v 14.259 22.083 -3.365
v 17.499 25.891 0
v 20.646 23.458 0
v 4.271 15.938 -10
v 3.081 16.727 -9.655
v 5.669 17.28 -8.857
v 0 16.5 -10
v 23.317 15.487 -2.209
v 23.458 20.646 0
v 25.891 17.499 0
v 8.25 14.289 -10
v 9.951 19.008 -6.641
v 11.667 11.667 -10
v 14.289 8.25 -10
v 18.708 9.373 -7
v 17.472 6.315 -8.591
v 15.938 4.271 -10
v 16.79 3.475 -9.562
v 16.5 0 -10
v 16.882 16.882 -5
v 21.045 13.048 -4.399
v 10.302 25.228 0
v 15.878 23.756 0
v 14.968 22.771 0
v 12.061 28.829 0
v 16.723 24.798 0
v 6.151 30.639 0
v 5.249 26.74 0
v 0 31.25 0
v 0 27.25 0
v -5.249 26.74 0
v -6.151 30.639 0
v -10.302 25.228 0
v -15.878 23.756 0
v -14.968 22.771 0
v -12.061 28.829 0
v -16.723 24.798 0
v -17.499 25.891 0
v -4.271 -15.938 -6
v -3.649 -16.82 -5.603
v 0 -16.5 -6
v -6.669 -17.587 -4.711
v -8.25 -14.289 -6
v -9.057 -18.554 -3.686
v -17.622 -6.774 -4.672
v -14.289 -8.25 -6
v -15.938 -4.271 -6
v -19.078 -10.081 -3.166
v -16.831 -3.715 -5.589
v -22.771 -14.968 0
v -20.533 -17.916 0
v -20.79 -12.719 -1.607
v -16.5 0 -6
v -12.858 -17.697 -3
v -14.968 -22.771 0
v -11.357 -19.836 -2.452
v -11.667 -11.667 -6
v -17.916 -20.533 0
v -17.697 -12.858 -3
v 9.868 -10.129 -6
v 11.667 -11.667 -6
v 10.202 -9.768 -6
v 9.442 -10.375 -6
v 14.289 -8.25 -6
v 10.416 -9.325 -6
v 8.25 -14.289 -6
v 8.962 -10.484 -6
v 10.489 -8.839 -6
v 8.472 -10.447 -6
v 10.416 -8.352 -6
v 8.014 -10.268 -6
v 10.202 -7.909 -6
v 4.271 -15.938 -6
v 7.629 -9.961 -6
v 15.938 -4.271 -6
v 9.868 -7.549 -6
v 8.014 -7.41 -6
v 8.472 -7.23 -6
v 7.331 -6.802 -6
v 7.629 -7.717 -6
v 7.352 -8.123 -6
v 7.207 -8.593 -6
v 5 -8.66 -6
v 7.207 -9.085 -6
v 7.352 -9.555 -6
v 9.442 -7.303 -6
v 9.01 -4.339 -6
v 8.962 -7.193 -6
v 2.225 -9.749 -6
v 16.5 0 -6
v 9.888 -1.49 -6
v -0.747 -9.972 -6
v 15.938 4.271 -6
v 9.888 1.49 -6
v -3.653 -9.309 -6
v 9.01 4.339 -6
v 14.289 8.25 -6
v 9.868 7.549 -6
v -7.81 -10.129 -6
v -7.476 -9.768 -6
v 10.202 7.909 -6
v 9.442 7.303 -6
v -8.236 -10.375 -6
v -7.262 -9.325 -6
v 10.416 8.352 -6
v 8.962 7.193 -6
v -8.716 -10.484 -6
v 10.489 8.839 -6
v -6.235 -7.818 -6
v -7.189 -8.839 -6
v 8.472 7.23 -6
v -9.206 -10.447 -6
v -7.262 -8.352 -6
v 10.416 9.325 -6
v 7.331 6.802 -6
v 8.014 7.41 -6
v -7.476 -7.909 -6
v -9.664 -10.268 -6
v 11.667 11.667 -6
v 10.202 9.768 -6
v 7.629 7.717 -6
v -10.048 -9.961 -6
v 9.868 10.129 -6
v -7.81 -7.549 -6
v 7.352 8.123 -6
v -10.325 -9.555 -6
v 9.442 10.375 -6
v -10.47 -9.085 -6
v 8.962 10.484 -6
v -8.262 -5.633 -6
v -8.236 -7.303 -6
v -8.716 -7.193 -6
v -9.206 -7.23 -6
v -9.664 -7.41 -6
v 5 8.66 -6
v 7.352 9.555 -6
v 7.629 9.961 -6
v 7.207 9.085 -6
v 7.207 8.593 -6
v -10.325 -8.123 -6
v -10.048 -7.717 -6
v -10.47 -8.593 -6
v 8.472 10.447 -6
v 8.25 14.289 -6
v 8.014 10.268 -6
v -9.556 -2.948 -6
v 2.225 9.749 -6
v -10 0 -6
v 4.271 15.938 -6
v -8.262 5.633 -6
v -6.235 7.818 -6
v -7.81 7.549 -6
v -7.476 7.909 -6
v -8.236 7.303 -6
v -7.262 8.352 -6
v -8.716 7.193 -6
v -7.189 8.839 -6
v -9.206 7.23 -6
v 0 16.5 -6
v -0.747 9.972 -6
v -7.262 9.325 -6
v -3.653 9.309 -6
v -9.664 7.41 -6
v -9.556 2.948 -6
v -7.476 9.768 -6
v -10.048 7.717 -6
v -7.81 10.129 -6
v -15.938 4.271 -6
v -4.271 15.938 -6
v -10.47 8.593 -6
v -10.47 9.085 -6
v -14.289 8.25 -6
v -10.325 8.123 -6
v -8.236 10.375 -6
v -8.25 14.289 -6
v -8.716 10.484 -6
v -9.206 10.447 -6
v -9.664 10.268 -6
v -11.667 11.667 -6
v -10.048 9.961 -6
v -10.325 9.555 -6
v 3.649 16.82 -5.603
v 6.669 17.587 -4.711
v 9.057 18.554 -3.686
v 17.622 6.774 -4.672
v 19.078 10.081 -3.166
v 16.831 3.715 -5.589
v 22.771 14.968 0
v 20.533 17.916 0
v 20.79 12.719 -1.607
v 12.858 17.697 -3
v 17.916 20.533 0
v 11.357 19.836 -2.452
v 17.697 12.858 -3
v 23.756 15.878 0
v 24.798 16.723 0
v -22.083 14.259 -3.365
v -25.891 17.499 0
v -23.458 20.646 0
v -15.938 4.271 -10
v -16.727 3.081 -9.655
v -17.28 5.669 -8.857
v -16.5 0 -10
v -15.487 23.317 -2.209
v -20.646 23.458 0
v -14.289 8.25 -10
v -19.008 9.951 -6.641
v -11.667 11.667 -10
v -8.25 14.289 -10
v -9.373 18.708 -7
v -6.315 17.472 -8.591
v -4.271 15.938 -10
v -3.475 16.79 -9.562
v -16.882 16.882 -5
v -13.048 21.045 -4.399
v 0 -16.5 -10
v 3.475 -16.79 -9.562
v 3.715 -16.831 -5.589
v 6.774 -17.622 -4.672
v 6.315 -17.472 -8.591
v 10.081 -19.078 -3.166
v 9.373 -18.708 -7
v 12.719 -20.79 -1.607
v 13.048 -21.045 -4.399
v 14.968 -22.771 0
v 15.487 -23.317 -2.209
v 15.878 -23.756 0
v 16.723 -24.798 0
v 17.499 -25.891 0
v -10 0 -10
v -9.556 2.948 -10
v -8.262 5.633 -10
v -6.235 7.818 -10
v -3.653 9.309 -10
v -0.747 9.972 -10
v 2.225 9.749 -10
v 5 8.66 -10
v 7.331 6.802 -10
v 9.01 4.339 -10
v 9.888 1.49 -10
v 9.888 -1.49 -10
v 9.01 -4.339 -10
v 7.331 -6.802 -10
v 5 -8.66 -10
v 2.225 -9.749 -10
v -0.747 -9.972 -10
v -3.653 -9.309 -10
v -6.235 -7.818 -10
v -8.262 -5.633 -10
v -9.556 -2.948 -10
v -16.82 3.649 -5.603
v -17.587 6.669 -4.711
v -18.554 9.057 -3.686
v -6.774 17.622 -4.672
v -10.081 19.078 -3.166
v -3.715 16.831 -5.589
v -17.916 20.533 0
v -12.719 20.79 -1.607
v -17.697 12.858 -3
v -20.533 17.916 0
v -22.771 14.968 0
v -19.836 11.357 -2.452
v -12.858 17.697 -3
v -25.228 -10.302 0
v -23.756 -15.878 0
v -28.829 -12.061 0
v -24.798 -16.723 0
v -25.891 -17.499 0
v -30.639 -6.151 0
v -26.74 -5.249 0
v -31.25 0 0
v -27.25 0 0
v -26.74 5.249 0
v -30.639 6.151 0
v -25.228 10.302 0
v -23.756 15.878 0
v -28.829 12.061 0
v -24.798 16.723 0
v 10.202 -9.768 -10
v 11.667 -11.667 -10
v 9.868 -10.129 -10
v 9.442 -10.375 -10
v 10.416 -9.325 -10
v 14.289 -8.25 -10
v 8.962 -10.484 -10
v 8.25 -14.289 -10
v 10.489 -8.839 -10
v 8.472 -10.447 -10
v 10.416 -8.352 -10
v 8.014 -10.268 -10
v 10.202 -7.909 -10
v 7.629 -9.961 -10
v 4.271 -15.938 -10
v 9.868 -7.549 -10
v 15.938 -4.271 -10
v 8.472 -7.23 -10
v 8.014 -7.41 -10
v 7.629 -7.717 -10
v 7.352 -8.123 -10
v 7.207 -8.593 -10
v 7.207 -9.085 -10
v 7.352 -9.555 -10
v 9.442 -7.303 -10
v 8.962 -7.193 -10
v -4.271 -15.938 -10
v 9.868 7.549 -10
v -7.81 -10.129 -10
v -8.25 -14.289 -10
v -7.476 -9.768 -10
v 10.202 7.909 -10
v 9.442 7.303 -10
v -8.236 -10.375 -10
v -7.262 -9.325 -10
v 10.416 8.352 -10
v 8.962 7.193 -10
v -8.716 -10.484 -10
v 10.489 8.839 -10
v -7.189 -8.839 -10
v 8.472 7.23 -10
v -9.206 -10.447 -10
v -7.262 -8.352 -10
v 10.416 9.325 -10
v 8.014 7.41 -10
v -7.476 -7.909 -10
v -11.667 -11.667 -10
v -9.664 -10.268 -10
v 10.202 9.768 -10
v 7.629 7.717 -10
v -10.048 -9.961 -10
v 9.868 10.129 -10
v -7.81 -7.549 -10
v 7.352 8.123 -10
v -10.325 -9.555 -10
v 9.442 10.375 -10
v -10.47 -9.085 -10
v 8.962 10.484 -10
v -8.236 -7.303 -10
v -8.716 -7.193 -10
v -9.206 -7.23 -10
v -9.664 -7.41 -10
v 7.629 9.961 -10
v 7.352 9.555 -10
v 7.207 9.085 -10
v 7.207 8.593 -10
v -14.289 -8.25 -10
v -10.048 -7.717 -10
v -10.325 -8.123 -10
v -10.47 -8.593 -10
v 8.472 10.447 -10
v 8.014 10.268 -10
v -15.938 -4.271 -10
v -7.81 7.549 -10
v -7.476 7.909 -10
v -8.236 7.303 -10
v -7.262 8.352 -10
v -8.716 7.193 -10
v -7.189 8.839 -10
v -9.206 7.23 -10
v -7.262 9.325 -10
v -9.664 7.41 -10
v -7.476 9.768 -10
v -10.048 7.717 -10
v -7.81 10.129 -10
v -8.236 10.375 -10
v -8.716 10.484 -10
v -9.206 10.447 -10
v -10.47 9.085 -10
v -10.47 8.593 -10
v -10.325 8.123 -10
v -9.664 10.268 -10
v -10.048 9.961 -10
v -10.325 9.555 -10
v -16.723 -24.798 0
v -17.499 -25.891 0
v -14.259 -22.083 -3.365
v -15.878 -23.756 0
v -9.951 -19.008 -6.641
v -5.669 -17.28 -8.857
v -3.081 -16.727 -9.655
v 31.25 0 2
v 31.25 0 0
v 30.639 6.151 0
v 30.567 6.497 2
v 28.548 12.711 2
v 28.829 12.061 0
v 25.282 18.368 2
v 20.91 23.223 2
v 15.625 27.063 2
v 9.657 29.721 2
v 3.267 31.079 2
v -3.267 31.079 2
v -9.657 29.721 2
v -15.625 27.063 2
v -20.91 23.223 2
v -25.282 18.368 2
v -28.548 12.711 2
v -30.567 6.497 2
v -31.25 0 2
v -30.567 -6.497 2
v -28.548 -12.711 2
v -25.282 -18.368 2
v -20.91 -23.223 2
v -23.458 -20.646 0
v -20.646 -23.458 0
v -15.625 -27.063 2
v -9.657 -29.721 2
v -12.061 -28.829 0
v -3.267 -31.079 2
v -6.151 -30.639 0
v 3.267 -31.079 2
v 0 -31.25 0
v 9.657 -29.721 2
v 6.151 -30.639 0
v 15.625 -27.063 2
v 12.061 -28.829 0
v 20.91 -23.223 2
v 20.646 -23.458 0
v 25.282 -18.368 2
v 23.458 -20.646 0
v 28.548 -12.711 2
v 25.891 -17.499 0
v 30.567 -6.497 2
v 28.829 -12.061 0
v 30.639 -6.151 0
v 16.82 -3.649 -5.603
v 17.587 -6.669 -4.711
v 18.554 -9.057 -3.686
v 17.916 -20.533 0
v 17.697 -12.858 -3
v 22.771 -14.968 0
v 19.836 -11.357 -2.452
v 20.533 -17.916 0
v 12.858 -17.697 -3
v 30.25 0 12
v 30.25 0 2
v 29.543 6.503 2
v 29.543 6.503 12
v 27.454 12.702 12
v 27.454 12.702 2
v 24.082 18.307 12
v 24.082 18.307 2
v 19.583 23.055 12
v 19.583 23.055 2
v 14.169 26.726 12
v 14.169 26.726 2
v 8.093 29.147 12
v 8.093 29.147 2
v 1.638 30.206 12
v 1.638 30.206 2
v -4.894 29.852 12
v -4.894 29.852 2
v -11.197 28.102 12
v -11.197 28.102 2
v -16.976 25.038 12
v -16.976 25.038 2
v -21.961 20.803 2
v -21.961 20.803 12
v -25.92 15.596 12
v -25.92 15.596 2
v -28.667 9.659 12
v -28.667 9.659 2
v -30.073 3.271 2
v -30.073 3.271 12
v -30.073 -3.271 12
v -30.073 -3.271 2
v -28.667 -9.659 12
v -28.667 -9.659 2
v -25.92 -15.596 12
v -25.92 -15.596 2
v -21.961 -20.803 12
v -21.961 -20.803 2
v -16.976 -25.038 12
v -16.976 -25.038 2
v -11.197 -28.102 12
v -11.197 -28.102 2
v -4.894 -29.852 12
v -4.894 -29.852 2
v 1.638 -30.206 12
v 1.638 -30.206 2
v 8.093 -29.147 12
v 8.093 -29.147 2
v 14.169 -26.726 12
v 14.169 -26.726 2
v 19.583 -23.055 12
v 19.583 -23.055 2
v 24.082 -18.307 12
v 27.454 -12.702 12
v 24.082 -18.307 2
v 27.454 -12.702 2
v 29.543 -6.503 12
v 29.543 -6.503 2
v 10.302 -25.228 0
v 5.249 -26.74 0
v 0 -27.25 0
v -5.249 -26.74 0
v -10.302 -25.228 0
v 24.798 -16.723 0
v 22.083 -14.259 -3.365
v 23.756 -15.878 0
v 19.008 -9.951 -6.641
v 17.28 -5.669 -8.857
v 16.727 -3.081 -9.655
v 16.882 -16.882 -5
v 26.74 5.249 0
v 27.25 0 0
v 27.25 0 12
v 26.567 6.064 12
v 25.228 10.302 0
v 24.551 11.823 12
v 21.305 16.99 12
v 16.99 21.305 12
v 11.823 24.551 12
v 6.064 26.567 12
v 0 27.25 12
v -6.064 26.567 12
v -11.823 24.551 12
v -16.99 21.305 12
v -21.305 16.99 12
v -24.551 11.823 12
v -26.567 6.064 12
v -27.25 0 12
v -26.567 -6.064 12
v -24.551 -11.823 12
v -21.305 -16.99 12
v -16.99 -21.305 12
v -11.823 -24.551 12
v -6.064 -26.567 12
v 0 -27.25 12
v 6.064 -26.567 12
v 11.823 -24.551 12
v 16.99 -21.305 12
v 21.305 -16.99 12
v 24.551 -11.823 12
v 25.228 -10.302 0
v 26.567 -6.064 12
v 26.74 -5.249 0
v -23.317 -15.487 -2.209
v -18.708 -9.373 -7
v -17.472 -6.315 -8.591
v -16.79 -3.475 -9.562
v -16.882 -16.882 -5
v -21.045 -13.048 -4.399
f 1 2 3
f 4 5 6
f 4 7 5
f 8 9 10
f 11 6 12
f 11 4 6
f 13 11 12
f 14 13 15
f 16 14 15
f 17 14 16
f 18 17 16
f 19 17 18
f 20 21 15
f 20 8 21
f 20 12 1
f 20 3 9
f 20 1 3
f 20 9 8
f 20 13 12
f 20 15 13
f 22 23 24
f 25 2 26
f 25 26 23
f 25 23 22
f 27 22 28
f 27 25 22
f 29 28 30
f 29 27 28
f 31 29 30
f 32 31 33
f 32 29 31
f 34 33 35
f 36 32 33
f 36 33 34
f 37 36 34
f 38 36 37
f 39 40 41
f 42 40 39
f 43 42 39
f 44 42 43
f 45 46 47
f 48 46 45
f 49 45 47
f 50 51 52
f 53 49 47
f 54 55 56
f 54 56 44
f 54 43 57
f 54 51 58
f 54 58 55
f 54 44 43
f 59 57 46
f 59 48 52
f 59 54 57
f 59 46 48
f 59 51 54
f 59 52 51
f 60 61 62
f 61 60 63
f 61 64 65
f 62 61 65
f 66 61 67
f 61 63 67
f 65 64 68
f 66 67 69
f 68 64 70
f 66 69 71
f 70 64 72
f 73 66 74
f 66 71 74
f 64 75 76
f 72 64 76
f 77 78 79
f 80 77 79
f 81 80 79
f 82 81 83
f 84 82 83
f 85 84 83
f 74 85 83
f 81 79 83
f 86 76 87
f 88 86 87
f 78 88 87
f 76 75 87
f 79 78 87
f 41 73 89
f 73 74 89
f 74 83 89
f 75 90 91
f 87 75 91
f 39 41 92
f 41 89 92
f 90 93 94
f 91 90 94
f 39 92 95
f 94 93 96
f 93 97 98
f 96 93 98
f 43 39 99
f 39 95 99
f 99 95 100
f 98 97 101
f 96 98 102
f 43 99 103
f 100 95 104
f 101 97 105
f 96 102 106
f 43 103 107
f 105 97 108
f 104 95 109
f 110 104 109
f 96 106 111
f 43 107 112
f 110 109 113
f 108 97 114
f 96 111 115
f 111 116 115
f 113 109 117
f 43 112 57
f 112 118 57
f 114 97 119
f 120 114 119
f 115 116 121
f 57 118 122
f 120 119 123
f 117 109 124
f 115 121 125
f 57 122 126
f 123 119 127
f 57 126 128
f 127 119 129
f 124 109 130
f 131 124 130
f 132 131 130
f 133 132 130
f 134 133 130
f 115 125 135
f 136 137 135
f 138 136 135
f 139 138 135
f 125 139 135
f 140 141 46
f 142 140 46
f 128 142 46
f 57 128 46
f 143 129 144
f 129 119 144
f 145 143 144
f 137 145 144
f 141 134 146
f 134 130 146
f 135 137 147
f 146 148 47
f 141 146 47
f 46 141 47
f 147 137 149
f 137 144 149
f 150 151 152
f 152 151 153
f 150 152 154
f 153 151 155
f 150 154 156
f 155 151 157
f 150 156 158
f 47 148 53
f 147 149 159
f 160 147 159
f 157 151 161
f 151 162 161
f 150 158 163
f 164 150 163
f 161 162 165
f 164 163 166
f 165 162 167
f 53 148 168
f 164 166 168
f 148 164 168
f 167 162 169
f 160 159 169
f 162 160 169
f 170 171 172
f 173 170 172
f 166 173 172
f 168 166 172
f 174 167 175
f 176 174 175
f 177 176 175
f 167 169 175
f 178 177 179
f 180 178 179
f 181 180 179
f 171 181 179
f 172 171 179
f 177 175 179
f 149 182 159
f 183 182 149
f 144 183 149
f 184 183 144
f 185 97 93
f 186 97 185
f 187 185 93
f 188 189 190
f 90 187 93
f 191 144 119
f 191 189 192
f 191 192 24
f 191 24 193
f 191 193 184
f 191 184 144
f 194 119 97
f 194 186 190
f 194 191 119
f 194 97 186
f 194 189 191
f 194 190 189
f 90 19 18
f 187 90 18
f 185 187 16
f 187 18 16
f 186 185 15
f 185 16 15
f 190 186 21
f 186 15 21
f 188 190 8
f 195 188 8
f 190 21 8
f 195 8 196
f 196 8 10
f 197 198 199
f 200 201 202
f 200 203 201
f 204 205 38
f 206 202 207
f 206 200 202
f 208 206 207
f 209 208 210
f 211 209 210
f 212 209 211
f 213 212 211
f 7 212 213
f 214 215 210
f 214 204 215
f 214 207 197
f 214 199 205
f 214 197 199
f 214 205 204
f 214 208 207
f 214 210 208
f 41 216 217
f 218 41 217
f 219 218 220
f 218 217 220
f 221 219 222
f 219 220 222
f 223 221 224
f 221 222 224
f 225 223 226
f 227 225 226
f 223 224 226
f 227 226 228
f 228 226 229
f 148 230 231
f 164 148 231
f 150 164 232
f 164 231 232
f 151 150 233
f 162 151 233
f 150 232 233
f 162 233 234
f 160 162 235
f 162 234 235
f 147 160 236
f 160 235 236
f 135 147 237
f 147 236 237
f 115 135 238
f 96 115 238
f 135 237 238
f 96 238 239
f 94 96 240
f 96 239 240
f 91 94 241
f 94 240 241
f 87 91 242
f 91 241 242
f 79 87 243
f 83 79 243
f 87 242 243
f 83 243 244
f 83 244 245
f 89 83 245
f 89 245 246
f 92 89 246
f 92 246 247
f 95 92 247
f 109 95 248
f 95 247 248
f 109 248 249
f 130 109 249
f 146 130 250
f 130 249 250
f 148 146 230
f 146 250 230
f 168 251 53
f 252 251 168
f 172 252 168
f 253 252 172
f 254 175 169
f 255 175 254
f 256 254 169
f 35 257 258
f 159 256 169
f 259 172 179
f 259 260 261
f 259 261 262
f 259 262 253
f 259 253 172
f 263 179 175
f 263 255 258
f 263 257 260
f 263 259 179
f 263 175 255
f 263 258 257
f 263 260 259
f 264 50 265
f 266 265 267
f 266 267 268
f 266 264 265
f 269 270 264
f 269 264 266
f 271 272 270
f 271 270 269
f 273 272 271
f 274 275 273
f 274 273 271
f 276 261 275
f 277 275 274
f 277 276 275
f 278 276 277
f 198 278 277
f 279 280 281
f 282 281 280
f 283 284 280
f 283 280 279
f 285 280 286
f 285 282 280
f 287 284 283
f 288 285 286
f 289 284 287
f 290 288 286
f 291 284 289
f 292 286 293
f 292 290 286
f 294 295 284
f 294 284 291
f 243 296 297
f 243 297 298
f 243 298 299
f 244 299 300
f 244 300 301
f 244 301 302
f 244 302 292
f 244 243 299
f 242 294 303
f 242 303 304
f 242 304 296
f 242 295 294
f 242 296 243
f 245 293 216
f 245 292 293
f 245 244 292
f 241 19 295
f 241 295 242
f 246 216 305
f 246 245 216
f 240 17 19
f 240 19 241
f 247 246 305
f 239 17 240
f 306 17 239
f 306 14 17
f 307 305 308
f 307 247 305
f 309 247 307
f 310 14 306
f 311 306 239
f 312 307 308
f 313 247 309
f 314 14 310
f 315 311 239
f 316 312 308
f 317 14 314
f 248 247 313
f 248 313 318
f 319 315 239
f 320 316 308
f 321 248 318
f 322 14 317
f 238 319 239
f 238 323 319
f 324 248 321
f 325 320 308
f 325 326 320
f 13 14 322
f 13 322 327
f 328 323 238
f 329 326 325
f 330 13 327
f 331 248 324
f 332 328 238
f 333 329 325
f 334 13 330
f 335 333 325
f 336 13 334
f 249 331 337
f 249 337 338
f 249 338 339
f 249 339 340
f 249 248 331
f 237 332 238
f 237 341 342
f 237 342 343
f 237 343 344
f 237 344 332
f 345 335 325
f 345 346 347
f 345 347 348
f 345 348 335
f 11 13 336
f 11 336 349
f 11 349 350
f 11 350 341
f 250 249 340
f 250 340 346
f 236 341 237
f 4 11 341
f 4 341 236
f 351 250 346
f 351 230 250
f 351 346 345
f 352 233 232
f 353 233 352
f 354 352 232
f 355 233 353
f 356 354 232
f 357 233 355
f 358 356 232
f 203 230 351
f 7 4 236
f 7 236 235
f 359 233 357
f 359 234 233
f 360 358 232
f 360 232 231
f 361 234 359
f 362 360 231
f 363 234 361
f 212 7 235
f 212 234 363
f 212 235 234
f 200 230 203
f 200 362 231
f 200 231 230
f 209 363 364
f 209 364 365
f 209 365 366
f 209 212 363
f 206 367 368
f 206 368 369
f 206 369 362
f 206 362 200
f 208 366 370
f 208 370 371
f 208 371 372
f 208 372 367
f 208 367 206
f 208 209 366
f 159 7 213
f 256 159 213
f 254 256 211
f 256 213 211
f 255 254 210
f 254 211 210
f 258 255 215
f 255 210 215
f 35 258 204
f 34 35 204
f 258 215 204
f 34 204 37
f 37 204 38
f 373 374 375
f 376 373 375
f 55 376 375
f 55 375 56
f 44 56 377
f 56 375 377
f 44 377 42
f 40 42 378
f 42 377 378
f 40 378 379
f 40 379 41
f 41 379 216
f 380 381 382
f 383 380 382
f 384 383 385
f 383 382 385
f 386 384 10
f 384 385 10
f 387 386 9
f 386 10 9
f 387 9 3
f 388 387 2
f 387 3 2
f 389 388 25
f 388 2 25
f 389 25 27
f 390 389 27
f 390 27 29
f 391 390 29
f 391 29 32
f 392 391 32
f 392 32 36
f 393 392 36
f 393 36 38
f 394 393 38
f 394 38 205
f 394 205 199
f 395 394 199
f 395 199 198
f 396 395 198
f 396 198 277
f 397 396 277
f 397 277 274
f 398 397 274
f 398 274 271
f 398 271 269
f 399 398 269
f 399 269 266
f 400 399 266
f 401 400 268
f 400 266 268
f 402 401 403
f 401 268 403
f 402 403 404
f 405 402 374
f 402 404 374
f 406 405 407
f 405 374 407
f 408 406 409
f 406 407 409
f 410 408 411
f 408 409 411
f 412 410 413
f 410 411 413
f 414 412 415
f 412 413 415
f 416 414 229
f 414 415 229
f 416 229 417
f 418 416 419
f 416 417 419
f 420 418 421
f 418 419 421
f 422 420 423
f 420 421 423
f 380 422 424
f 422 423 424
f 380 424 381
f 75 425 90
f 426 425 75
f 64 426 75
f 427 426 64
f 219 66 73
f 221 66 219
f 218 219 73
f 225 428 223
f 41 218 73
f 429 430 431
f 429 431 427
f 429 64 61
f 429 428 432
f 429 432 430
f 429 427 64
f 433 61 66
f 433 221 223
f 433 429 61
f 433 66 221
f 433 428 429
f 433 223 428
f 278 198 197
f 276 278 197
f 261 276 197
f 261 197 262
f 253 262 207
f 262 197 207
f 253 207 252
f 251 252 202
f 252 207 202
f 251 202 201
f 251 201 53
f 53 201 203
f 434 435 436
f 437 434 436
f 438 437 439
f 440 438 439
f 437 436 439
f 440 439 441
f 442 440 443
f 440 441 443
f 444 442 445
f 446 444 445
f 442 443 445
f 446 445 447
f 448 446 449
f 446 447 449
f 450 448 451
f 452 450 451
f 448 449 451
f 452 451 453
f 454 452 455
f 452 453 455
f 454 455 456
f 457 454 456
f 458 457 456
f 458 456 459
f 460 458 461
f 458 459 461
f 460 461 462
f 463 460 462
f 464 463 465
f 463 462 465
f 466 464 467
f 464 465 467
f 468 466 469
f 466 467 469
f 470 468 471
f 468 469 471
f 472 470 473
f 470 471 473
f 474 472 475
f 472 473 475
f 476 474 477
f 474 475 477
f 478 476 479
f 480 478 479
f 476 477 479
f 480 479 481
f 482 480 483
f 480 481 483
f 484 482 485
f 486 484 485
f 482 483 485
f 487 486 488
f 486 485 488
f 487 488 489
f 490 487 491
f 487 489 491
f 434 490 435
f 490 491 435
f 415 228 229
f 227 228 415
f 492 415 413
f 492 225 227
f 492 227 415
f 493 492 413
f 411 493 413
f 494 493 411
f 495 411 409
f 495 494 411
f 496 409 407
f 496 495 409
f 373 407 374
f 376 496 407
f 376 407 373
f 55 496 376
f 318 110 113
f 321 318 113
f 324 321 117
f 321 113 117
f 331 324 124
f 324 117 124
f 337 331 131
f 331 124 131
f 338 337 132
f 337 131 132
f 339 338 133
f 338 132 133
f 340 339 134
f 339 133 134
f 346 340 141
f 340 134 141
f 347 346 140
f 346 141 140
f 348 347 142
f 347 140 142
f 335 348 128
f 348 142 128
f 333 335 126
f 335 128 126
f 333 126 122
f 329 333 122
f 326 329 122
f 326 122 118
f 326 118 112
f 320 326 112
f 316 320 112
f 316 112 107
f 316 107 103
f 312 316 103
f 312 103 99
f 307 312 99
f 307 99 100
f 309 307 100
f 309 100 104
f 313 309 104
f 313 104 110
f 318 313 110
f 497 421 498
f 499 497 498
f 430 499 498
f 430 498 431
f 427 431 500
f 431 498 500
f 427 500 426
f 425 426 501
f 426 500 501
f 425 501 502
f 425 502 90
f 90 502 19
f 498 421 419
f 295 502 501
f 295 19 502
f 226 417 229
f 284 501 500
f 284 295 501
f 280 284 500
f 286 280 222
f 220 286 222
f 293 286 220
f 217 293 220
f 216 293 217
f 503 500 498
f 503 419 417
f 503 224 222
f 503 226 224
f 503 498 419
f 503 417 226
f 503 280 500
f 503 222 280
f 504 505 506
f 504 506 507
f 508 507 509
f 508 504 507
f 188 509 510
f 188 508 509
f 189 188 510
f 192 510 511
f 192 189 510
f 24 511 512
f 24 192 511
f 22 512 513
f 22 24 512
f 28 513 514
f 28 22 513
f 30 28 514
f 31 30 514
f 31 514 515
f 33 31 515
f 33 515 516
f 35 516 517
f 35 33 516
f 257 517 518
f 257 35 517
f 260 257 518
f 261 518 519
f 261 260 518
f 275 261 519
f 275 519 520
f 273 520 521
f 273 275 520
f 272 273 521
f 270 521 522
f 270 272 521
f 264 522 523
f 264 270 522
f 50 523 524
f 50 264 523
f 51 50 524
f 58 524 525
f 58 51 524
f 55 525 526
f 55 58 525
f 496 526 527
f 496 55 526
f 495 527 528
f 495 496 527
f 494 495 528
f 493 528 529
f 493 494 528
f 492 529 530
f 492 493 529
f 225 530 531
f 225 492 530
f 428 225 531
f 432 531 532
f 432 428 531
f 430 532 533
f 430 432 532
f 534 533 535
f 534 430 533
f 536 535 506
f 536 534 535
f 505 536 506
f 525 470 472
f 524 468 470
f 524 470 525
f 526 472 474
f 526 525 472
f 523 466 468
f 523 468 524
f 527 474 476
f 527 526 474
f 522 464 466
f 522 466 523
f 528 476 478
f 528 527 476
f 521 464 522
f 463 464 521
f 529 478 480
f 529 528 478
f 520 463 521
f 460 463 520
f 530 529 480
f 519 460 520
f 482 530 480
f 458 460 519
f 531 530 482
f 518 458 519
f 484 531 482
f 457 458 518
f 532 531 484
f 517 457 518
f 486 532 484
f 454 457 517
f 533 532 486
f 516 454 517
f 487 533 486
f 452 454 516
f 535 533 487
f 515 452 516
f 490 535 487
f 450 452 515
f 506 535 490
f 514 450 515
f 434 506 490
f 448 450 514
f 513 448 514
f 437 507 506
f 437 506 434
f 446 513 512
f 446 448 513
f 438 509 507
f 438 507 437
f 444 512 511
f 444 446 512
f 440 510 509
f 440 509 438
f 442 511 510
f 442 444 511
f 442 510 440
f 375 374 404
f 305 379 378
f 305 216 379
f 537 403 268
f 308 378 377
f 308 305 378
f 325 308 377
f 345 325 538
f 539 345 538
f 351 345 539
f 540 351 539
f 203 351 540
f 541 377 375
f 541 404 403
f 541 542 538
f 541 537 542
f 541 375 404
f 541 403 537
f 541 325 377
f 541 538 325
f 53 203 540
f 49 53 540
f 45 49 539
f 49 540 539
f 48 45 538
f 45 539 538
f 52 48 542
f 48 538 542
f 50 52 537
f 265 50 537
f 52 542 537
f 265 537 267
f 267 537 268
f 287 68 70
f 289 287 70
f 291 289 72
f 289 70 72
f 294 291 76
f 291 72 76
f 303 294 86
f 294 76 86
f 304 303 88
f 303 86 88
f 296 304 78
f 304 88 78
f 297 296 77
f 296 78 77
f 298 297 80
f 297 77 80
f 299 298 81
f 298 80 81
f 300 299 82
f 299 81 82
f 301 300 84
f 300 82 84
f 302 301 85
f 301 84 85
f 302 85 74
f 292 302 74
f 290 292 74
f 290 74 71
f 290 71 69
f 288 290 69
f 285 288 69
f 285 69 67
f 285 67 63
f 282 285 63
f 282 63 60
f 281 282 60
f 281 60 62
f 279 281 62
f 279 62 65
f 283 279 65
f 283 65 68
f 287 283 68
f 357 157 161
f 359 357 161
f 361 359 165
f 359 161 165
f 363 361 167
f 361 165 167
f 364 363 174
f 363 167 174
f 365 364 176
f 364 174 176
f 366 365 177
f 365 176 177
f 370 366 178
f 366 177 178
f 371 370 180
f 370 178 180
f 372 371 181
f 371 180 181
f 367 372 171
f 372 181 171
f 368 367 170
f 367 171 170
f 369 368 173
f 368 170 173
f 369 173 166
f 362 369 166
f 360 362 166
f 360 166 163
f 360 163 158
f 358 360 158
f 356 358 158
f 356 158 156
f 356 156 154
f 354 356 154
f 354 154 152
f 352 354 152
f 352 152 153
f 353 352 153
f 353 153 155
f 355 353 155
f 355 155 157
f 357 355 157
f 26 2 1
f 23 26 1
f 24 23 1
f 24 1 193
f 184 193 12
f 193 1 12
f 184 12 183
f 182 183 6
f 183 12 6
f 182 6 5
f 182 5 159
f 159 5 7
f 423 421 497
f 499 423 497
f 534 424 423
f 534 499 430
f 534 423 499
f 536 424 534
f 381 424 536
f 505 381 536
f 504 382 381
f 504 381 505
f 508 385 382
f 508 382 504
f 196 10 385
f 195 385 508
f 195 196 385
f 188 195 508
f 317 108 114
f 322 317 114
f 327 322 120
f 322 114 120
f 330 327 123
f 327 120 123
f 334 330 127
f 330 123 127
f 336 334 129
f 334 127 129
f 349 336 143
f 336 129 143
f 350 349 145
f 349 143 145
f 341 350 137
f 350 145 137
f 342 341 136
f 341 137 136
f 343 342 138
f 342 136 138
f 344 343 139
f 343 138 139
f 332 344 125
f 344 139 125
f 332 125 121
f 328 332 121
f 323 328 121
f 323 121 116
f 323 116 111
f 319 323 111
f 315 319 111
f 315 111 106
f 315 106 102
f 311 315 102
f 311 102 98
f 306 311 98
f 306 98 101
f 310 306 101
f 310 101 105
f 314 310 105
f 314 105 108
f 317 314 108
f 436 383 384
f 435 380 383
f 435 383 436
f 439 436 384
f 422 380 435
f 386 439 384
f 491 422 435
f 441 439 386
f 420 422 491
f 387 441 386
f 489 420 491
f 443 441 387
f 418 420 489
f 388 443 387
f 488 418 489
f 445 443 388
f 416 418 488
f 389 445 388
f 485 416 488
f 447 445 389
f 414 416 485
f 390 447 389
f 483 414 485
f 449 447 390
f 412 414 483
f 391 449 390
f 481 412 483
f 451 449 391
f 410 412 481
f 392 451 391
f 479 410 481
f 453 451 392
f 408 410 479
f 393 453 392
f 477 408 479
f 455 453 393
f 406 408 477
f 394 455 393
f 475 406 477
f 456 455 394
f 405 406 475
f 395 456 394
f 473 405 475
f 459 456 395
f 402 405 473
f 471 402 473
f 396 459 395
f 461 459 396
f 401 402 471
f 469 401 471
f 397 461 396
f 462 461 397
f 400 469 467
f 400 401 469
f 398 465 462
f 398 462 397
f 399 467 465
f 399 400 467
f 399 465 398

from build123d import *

# Parameters (mm, degrees)
SKETCH1_R             = 31.25
SKETCH1_R_2           = 27.25
BOSS_EXTRUDE2_DEPTH   = 12
SKETCH7_R             = 16.5
SKETCH7_R_2           = 10
BOSS_EXTRUDE6_DEPTH   = 4
SKETCH7_16_OUTSIDE_W  = 82.718
SKETCH7_16_OUTSIDE_H  = 82.718
CUT_EXTRUDE3_DEPTH    = 10
M4X0_7_TAPPED_HOLE1_D = 3.3
CUT_EXTRUDE4_START    = -10
SKETCH20_R            = 31.25
SKETCH20_R_2          = 30.25
CUT_EXTRUDE4_DEPTH    = 10


with BuildPart() as part:
    # Sketch1 → Boss-Extrude2 (new body)
    with BuildSketch(Plane.XY):
        Circle(SKETCH1_R)
        Circle(SKETCH1_R_2, mode=Mode.SUBTRACT)
    extrude(amount=BOSS_EXTRUDE2_DEPTH)



with BuildPart() as body_2:
    # Sketch7 → Boss-Extrude6 (new body)
    with BuildSketch(Plane(origin=(0, 0, -10), x_dir=(-1, 0, 0), z_dir=(0, 0, -1))):
        Circle(SKETCH7_R)
        Circle(SKETCH7_R_2, mode=Mode.SUBTRACT)
    extrude(amount=-BOSS_EXTRUDE6_DEPTH)


with BuildPart() as part_1:
    add(part.part)

    add(body_2.part)  # Revolve1 merges body 2
    # Sketch10 → Revolve1 (revolve)
    with BuildSketch(Plane(origin=(0, 0, 0), x_dir=(1, 0, 0), z_dir=(0, 1, 0))):
        Polygon((-31.25, 0), (-27.25, 0), (-16.5, 6), (-16.5, 10), align=None)
    revolve(axis=Axis((0, 0, 0), (0, 0, -1)))

    # Sketch7<16> outside → Cut-Extrude3 (cut)
    with BuildSketch(Plane(origin=(0, 0, -10), x_dir=(-1, 0, 0), z_dir=(0, 0, -1))):
        Rectangle(SKETCH7_16_OUTSIDE_W, SKETCH7_16_OUTSIDE_H)
        with BuildLine():
            ThreePointArc((25.890833333, 17.499349968), (18.996047719, 9.929942094), (16.5, 0))
            ThreePointArc((16.5, 0), (18.996047719, -9.929942094), (25.890833333, -17.499349968))
            ThreePointArc((25.890833333, -17.499349968), (22.097086912, -22.097086912), (17.499349968, -25.890833333))
            ThreePointArc((17.499349968, -25.890833333), (9.929942094, -18.996047719), (0, -16.5))
            ThreePointArc((0, -16.5), (-9.929942094, -18.996047719), (-17.499349968, -25.890833333))
            ThreePointArc((-17.499349968, -25.890833333), (-22.097086912, -22.097086912), (-25.890833333, -17.499349968))
            ThreePointArc((-25.890833333, -17.499349968), (-18.996047719, -9.929942094), (-16.5, 0))
            ThreePointArc((-16.5, 0), (-18.996047719, 9.929942094), (-25.890833333, 17.499349968))
            ThreePointArc((-25.890833333, 17.499349968), (-22.097086912, 22.097086912), (-17.499349968, 25.890833333))
            ThreePointArc((-17.499349968, 25.890833333), (-9.929942094, 18.996047719), (0, 16.5))
            ThreePointArc((0, 16.5), (9.929942094, 18.996047719), (17.499349968, 25.890833333))
            ThreePointArc((17.499349968, 25.890833333), (22.097086912, 22.097086912), (25.890833333, 17.499349968))
        make_face(mode=Mode.SUBTRACT)
    extrude(amount=-CUT_EXTRUDE3_DEPTH, mode=Mode.SUBTRACT)

    # M4x0.7 Tapped Hole1 (through all)
    with Locations(Plane(origin=(0, 0, -10), x_dir=(-1, 0, 0), z_dir=(0, 0, -1))):
        with Locations((-8.838834765, 8.838834765), (8.838834765, 8.838834765), (8.838834765, -8.838834765), (-8.838834765, -8.838834765)):
            Hole(M4X0_7_TAPPED_HOLE1_D / 2)

    # Sketch20 → Cut-Extrude4 (cut)
    with BuildSketch(Plane.XY.offset(12).offset(CUT_EXTRUDE4_START)):
        Circle(SKETCH20_R)
        Circle(SKETCH20_R_2, mode=Mode.SUBTRACT)
    extrude(amount=CUT_EXTRUDE4_DEPTH, mode=Mode.SUBTRACT)


solid = part_1.part
